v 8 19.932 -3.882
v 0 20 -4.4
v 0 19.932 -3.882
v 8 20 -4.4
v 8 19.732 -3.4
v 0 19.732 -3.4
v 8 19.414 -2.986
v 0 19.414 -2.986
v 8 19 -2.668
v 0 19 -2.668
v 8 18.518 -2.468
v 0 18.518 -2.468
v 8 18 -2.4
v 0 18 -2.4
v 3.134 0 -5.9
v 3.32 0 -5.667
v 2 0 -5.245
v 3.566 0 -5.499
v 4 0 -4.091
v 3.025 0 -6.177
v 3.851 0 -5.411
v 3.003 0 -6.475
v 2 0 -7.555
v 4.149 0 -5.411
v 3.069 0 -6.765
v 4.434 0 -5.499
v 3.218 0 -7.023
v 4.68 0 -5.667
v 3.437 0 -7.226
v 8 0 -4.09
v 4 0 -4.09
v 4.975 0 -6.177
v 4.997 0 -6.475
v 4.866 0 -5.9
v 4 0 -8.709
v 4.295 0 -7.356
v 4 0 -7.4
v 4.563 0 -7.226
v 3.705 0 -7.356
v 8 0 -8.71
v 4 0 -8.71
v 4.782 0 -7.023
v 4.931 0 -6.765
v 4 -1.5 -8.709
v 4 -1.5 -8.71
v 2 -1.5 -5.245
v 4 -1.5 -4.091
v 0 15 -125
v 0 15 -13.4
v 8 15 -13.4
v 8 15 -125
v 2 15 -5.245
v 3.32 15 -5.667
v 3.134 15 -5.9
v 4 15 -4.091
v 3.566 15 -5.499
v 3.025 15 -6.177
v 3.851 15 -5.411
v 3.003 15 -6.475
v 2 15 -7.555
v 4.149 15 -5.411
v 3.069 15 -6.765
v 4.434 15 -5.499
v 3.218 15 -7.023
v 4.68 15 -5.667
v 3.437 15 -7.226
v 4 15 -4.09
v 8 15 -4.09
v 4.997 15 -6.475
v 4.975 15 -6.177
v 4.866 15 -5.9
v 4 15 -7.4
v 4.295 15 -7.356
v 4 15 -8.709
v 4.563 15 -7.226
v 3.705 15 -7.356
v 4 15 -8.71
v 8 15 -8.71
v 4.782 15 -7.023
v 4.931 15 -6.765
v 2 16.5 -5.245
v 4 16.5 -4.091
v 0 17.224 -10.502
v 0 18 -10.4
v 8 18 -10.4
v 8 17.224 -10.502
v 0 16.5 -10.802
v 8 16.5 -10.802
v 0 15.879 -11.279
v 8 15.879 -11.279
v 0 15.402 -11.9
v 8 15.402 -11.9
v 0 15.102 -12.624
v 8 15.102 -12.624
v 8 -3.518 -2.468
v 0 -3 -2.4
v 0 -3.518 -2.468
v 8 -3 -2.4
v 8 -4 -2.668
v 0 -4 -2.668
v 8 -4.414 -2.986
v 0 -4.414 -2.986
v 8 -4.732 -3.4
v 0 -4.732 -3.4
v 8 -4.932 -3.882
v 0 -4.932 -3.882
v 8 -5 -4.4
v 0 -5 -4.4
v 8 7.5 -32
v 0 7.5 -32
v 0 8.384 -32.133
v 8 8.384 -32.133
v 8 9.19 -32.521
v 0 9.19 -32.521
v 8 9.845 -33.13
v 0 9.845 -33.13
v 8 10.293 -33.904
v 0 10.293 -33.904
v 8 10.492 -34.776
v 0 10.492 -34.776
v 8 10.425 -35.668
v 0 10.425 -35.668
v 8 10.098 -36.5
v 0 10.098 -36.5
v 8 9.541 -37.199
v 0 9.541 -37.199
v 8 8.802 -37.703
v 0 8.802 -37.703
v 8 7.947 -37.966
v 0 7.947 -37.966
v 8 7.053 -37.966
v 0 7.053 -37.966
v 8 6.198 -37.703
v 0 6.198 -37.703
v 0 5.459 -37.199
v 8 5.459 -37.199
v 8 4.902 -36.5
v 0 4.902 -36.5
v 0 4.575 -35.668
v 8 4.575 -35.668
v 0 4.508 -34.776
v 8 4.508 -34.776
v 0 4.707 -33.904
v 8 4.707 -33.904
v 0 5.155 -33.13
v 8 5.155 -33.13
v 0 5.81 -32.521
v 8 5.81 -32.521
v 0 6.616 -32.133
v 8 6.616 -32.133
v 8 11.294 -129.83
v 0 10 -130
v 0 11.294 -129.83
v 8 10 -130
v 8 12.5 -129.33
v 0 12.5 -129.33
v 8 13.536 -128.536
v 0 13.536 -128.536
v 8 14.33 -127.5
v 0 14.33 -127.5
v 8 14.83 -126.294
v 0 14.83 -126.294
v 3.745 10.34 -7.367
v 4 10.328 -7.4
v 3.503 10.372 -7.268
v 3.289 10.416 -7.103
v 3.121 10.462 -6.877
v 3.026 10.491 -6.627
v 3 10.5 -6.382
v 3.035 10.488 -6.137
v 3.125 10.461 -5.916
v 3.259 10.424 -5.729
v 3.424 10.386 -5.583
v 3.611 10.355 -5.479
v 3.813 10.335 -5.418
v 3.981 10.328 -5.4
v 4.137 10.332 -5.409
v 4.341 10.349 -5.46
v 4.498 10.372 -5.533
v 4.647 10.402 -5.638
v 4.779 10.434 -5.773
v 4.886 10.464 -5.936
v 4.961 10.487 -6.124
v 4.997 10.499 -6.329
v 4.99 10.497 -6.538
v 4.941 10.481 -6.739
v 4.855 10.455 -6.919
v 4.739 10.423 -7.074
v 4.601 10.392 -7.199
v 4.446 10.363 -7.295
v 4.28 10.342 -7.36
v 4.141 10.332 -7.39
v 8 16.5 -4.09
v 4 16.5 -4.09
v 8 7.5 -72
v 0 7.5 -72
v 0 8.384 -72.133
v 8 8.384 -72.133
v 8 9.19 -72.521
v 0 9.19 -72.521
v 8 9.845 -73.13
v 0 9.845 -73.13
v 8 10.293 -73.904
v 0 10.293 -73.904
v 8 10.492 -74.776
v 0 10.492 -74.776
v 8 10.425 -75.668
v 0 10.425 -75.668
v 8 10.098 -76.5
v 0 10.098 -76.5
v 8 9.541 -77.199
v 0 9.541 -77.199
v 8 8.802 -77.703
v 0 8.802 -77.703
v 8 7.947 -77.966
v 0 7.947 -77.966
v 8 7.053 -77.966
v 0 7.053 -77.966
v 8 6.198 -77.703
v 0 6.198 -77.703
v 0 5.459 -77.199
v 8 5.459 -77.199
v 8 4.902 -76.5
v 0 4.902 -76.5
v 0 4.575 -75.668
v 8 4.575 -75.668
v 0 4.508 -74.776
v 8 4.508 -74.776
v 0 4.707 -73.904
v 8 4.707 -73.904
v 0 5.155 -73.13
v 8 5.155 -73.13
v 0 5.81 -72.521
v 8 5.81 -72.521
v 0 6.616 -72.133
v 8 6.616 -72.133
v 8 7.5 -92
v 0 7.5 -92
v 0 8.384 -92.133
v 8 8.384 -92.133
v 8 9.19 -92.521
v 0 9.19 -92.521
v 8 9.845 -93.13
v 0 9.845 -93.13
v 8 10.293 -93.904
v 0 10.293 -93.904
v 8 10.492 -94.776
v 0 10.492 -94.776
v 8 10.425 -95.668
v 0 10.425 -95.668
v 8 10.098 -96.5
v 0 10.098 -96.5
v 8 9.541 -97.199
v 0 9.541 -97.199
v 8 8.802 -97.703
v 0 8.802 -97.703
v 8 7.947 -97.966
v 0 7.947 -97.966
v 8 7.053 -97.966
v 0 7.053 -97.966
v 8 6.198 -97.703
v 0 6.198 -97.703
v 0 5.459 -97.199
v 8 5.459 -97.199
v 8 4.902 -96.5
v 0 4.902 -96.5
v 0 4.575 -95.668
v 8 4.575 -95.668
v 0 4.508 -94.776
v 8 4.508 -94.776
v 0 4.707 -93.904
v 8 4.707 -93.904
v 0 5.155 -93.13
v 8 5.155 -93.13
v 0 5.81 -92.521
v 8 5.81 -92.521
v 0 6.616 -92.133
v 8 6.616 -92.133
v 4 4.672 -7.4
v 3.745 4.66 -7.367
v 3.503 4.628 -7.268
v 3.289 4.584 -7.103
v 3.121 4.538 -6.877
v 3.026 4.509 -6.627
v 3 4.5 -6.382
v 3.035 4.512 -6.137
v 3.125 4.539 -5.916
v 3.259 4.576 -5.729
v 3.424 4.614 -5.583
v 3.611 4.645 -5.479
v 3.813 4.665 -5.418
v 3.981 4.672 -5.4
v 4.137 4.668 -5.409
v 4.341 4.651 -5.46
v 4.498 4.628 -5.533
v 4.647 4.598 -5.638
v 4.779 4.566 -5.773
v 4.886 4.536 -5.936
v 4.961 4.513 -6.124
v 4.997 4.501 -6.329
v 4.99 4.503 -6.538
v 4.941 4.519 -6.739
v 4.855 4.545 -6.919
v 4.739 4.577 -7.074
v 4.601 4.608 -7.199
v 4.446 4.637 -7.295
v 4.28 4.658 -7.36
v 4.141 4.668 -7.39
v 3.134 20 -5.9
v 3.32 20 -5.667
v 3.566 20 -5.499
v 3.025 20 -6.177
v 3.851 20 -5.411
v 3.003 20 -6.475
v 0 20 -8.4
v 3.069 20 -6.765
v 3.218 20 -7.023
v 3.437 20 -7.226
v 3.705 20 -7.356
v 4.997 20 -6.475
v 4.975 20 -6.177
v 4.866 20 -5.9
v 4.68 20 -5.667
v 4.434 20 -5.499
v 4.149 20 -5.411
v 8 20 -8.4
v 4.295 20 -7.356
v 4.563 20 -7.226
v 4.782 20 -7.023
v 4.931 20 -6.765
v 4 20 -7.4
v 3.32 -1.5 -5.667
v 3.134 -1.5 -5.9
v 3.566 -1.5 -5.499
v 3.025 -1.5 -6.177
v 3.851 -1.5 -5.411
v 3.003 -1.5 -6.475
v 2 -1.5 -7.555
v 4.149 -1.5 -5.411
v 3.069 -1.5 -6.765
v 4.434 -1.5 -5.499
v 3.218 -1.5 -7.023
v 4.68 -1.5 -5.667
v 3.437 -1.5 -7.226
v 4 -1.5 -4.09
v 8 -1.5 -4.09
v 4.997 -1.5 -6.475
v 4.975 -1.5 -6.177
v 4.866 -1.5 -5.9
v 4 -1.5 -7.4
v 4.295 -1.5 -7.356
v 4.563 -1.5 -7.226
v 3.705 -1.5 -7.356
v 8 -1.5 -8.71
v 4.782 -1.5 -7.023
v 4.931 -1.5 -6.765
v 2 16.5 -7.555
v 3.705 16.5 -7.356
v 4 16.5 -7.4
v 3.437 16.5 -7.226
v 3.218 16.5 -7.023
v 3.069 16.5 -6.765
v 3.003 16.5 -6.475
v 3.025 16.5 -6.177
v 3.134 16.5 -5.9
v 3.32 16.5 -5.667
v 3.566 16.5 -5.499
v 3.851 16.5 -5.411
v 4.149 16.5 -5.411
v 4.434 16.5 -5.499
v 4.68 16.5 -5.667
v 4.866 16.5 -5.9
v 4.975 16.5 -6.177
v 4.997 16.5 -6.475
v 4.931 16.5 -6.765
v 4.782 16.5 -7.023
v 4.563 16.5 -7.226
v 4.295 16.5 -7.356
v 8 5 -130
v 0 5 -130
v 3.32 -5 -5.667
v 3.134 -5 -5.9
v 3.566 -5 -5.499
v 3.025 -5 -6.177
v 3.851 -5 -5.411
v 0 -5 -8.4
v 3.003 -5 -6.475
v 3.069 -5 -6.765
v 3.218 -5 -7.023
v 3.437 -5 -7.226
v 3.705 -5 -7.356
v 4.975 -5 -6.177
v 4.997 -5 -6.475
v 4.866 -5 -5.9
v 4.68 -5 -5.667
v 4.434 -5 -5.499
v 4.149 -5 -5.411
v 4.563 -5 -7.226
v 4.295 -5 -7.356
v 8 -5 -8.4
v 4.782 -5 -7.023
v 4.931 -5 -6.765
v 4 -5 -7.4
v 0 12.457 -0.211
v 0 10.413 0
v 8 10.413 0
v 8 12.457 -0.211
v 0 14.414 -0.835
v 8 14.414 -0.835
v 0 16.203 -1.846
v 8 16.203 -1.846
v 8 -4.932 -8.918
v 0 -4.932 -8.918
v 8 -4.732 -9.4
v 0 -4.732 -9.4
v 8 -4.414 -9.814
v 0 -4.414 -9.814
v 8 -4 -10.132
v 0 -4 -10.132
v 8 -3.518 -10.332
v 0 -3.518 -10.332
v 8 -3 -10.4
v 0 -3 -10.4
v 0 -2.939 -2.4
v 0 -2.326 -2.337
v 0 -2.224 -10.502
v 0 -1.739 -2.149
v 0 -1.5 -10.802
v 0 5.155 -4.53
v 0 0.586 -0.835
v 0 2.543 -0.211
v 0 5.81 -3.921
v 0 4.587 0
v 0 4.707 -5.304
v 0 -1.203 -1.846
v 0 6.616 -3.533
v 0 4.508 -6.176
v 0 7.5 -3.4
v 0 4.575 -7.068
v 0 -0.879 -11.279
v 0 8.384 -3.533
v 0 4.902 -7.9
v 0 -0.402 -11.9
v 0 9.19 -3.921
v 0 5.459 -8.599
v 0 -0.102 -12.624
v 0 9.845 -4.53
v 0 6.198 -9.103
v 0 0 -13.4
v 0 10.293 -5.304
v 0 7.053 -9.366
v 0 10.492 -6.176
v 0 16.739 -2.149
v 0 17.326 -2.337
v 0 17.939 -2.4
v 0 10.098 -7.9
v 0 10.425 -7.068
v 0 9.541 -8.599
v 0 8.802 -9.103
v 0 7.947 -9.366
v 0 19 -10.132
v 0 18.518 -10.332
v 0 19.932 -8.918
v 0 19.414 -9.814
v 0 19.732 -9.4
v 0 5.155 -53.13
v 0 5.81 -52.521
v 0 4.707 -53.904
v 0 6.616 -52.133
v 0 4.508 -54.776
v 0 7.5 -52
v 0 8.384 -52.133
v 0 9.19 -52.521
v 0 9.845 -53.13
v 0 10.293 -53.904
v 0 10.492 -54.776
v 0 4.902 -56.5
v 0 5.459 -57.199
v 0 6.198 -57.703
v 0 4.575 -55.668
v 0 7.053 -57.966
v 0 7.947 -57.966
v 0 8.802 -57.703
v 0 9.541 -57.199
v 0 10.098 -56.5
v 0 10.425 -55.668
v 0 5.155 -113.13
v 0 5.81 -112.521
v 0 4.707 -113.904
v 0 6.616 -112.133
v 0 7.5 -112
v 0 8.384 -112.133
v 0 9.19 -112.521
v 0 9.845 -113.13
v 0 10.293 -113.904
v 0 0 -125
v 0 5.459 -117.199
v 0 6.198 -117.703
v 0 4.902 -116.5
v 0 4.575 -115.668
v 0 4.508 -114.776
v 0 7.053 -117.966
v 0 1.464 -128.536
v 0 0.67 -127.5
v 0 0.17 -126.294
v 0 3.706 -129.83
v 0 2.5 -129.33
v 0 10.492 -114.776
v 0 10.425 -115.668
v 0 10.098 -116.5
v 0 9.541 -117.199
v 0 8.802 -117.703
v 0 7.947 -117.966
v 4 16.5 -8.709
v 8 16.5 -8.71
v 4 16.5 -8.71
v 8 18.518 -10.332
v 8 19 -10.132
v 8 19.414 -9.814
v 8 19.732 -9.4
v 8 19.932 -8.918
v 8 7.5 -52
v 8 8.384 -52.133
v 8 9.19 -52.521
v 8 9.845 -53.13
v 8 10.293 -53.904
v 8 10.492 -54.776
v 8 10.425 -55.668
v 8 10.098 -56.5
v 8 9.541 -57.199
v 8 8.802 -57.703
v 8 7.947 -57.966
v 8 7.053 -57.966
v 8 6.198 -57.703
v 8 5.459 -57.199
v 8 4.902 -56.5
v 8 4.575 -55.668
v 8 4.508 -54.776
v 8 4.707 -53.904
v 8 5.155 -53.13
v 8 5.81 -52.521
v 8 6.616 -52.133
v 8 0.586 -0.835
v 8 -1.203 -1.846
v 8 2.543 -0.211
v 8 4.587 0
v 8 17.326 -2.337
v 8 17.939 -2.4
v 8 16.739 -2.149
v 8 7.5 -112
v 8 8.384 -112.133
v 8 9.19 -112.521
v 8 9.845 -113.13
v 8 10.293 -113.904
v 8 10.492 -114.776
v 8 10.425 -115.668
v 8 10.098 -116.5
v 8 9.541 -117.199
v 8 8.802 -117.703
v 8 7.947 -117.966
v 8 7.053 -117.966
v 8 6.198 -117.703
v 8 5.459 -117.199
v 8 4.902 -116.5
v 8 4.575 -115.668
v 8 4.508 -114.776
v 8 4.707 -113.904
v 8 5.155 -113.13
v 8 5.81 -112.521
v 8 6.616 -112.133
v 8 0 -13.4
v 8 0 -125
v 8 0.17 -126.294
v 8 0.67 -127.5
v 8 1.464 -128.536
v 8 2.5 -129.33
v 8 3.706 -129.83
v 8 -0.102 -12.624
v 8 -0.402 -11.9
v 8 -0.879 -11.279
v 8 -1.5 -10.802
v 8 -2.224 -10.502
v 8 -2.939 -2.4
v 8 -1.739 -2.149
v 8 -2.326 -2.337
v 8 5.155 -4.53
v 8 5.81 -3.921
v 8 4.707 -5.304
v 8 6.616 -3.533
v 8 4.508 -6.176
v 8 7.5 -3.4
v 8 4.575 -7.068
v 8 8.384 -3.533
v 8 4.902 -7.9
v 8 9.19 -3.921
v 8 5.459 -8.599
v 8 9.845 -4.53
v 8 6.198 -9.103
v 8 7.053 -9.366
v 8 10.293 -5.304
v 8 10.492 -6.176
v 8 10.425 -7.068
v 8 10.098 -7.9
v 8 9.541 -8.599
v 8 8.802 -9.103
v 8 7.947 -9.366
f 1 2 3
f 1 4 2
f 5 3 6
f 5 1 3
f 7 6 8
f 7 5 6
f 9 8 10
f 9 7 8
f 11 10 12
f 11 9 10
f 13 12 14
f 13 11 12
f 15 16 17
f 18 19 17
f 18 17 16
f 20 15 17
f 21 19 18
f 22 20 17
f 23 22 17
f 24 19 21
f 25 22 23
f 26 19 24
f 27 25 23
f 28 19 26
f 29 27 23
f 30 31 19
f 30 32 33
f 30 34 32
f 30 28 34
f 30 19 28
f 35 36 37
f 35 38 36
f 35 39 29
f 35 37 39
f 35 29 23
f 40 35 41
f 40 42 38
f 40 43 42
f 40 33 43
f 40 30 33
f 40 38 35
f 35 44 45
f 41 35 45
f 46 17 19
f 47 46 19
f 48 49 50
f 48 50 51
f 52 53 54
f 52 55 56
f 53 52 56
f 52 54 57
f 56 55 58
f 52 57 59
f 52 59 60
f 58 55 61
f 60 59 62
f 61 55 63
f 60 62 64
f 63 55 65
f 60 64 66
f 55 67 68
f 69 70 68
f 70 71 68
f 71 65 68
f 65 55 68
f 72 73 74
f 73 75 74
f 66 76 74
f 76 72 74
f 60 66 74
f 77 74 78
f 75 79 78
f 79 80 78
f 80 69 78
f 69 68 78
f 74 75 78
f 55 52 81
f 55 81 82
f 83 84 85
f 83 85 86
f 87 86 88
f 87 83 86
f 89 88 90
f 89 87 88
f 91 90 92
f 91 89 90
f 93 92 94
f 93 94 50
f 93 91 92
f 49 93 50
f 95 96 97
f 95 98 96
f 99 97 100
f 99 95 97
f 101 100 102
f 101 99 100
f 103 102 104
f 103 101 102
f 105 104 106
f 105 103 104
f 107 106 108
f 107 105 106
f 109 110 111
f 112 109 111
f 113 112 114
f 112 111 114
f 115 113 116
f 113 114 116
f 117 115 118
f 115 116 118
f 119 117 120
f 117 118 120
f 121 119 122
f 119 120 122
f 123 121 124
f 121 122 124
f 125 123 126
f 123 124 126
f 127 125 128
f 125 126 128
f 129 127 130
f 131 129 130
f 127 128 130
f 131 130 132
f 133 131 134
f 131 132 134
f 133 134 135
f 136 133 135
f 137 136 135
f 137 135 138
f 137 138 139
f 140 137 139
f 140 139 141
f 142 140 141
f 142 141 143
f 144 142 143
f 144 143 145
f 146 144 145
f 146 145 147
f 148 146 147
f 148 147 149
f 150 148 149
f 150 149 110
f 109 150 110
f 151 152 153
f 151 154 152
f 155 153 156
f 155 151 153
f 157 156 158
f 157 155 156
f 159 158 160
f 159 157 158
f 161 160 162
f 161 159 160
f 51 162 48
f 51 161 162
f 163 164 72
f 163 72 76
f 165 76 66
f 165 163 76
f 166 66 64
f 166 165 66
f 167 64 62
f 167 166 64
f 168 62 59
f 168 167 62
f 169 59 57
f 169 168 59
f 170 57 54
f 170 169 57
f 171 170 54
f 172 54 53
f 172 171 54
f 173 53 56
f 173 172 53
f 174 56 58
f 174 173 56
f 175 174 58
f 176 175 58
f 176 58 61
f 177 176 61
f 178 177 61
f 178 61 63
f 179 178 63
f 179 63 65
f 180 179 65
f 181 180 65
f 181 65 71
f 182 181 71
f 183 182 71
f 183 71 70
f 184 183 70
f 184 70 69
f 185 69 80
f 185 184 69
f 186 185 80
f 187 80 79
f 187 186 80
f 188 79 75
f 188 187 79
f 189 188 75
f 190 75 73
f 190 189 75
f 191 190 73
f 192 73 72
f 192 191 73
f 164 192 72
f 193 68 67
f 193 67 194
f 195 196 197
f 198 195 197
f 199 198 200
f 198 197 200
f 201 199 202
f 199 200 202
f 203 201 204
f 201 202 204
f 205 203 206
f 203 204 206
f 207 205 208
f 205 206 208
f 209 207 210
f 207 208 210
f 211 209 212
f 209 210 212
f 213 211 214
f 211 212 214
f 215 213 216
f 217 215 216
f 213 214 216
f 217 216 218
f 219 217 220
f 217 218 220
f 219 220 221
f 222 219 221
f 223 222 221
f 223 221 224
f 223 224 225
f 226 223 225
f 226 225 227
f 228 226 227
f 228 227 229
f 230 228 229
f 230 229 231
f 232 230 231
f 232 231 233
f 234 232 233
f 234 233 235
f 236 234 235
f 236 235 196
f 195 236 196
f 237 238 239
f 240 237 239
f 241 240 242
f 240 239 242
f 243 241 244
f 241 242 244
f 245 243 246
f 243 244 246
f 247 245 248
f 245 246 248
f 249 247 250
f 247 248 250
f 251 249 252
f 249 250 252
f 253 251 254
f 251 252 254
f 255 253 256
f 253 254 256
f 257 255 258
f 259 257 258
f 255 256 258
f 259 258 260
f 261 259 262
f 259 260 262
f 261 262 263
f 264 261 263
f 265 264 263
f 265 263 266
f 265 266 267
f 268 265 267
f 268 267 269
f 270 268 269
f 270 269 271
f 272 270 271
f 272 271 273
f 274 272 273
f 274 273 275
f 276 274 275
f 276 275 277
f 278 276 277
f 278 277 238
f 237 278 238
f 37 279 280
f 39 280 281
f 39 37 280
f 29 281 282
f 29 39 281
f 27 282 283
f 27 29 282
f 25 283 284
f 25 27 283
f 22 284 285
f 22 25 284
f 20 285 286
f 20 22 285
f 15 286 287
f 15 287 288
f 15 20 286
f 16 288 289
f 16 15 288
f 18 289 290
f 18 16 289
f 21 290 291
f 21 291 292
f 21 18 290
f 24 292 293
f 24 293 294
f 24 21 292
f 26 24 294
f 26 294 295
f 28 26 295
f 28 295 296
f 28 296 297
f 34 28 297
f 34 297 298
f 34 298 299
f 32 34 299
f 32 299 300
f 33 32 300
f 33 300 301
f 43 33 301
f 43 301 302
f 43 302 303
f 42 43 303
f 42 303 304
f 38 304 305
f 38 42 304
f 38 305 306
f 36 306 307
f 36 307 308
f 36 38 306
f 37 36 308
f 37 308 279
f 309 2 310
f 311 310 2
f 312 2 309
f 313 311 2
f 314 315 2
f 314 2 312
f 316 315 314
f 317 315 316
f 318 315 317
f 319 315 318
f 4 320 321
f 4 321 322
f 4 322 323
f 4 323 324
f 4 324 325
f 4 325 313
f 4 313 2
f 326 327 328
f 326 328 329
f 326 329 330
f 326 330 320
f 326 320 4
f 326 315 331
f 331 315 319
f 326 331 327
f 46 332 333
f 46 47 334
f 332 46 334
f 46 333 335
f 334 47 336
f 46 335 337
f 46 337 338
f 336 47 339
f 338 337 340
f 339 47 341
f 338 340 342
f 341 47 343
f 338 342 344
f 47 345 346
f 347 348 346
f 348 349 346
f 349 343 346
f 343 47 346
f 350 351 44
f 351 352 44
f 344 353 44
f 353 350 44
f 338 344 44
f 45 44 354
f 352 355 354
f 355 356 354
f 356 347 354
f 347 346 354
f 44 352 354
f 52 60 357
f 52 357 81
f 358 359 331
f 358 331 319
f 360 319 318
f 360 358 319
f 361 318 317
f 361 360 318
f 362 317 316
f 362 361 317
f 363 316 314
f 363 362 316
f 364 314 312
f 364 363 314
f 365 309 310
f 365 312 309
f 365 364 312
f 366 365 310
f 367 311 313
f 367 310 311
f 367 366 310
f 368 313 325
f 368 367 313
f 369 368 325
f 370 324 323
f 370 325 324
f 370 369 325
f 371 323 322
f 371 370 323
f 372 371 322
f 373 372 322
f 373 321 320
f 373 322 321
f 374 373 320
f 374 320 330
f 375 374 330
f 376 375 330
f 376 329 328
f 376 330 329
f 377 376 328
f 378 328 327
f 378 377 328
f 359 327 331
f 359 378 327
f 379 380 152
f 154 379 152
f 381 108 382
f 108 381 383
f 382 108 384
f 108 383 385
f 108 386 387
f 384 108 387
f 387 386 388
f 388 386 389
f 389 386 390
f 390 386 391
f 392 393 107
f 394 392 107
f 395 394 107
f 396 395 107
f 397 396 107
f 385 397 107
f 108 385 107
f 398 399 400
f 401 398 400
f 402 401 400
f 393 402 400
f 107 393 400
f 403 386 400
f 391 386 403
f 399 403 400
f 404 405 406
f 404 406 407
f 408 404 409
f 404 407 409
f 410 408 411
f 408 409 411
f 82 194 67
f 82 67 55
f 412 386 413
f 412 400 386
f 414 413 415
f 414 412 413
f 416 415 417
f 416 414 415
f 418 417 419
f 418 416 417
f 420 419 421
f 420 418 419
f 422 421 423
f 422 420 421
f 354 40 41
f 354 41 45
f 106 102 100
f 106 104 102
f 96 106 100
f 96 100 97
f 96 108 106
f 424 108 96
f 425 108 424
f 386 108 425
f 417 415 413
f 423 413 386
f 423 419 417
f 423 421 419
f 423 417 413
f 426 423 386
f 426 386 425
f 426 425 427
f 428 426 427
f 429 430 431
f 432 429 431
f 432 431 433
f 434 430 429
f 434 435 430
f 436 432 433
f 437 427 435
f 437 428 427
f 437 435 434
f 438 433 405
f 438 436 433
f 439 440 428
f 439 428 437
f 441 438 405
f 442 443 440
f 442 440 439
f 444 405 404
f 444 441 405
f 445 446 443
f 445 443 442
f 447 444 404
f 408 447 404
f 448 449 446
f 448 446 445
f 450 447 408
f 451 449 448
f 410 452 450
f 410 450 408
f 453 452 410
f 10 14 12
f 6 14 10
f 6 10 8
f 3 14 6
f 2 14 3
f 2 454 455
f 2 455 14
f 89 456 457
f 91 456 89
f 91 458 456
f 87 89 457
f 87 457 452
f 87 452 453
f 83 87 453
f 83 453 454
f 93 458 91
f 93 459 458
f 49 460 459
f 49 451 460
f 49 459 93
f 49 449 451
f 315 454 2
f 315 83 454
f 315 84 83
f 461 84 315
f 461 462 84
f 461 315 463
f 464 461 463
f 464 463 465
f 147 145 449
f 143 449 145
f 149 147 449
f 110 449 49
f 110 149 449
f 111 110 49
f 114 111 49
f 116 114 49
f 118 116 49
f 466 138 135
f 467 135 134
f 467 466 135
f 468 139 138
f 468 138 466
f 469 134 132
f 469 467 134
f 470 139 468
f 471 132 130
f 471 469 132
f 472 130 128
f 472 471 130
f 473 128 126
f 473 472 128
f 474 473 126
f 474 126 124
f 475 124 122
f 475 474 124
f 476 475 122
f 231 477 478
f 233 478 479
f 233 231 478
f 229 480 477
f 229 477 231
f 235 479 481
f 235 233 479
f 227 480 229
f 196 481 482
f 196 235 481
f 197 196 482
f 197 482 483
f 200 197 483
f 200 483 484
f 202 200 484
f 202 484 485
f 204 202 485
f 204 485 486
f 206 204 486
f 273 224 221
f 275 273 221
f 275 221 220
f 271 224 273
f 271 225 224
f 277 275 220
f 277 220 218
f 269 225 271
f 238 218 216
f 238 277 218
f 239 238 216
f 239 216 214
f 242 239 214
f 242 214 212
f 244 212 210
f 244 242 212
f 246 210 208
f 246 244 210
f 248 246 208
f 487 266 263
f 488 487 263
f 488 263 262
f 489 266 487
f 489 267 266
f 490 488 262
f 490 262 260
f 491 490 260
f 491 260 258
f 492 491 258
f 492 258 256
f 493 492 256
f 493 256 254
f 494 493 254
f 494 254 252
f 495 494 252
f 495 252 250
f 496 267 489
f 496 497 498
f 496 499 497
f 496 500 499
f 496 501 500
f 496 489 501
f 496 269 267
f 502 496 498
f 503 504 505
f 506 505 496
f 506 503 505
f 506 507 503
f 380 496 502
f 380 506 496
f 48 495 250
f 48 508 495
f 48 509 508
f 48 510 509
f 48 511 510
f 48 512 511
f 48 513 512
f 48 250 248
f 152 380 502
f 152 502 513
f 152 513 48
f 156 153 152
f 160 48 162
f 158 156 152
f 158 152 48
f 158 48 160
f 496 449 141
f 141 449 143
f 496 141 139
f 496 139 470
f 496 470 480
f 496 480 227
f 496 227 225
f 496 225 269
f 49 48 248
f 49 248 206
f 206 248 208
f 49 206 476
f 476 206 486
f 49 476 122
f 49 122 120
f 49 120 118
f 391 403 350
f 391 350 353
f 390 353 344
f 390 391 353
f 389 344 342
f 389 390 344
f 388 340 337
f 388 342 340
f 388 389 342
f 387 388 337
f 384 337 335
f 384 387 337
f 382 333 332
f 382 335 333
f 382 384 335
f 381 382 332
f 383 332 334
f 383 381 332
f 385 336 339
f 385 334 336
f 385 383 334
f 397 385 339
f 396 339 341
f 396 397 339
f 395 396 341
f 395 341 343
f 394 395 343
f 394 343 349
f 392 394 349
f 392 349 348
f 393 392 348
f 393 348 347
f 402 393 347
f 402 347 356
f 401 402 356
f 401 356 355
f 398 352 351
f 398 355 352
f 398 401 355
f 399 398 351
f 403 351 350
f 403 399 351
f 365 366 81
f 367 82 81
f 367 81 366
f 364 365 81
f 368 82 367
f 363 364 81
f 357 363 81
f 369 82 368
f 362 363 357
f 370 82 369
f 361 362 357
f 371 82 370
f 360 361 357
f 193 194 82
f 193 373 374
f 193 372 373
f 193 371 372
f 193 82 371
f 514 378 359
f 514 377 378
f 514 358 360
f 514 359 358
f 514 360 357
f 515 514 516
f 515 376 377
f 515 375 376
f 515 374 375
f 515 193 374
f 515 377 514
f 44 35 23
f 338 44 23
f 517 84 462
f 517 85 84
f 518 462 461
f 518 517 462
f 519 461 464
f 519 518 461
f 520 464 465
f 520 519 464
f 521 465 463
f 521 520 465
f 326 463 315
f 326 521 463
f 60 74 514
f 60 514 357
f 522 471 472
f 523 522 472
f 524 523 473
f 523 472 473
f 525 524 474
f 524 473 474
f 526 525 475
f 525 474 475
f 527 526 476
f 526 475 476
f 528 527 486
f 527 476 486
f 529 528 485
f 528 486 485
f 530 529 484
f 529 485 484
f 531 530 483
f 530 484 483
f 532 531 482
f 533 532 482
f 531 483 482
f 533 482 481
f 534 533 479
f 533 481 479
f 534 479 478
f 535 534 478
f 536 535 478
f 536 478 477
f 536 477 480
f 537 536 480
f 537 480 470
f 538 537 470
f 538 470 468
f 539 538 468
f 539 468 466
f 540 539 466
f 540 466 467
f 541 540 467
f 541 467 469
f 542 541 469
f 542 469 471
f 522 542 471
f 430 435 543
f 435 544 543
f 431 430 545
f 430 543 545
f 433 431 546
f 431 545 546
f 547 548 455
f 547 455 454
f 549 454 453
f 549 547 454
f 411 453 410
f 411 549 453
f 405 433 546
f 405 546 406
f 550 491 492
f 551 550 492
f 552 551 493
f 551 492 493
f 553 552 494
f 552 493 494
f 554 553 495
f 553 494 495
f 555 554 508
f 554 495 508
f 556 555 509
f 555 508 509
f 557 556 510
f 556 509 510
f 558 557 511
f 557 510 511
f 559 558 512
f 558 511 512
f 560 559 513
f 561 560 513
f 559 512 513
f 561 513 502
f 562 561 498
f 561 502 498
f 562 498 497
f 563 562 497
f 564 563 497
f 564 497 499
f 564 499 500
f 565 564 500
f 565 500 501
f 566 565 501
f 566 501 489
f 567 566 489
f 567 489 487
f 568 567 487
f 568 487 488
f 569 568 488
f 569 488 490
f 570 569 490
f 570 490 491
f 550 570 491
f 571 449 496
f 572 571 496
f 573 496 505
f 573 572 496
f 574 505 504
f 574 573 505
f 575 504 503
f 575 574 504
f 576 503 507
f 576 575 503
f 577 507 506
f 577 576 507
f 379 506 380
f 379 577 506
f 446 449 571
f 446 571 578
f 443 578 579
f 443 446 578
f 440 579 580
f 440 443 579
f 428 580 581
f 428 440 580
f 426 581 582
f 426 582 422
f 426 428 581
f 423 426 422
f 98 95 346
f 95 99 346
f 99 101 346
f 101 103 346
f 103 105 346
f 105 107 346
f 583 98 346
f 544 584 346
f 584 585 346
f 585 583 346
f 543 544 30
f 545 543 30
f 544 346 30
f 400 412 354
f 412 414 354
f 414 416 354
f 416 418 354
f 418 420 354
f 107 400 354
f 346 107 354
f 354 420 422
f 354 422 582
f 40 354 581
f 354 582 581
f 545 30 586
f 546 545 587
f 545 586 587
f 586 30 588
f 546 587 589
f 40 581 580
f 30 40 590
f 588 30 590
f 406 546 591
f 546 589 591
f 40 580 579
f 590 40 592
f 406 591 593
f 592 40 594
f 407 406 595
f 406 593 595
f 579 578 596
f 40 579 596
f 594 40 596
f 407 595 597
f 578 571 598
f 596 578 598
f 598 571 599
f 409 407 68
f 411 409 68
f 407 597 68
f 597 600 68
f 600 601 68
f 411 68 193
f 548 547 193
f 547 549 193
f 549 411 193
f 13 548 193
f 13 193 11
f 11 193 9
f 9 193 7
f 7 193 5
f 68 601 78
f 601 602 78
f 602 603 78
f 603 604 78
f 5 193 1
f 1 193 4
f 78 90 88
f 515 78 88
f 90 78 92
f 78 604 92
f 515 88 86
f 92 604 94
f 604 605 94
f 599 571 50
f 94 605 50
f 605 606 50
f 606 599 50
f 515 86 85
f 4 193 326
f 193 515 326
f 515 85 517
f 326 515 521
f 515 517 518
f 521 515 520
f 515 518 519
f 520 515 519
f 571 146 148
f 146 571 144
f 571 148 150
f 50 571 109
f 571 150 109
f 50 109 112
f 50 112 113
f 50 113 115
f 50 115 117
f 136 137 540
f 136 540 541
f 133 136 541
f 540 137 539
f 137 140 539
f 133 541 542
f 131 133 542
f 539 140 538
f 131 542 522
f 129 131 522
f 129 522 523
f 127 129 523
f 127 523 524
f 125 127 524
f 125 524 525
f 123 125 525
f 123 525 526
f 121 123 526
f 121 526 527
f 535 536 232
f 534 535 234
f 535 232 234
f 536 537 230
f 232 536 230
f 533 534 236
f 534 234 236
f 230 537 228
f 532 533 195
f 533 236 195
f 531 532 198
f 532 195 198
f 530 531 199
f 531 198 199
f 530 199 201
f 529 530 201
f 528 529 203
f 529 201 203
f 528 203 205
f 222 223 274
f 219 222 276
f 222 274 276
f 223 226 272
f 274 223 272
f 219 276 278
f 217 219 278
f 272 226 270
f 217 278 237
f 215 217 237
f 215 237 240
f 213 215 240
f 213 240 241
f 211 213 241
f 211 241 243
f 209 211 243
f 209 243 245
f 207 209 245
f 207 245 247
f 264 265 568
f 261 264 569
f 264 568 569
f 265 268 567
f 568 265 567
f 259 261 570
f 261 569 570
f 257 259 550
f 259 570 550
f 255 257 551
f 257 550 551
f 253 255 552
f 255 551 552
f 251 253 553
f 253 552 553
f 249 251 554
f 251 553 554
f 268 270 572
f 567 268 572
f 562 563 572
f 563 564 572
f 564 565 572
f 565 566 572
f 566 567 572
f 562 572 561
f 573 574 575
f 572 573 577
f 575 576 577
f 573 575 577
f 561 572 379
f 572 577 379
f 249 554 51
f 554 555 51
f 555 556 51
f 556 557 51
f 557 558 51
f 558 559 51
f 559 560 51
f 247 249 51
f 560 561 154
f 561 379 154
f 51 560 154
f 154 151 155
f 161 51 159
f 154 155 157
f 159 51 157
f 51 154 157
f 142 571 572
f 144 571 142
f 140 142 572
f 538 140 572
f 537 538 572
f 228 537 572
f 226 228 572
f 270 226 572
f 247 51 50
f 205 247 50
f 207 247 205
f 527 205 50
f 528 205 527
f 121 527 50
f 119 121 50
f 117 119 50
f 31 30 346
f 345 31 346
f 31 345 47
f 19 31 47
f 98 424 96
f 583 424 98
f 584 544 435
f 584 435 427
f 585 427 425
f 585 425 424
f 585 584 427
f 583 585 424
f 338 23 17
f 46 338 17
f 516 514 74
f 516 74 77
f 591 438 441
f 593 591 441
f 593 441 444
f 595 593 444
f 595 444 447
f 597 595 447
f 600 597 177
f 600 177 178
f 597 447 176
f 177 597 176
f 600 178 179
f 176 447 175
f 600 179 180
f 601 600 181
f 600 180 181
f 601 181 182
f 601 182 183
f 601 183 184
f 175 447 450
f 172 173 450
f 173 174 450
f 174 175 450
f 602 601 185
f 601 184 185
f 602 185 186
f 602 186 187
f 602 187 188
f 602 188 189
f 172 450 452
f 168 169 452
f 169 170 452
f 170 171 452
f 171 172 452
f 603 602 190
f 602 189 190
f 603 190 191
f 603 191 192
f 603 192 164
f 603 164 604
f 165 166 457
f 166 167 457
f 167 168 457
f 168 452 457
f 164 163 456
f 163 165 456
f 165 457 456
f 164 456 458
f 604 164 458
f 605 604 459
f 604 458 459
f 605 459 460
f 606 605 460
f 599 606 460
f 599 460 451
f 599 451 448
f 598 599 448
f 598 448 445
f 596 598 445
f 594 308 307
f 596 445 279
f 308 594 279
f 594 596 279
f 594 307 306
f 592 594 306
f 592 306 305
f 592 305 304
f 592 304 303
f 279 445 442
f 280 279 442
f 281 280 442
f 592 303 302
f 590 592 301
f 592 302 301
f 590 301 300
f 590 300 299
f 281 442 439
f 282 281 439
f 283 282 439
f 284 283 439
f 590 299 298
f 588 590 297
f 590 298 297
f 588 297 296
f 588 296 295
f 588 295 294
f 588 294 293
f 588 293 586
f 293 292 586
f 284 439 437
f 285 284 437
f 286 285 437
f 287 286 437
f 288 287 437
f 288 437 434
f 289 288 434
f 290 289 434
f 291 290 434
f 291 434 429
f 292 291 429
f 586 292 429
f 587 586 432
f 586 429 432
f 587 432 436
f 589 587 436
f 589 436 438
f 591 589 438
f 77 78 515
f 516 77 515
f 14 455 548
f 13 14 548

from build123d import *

# Parameters (mm, degrees)
SKETCH_1_W                = 130
SKETCH_1_H                = 15
EXTRUDE_1_DEPTH           = 8
CUT_EXTRUDE_10_REACH      = 133.107
SKETCH_17_R               = 3
CUT_EXTRUDE_12_REACH      = 133.107
SKETCH_15_R               = 3
SKETCH_22_W               = 8
SKETCH_22_H               = 8
EXTRUDE_7_DEPTH           = 5
CUT_EXTRUDE_18_DEPTH      = 1.5
SKETCH_25_W               = 4.62
SKETCH_25_H               = 1.5
CUT_EXTRUDE_19_DEPTH      = 4
FILLET_8_R                = 3
FILLET_9_R                = 2
FILLET_10_R               = 2
FILLET_11_R               = 3
CUT_EXTRUDE_20_DEPTH      = 15.5
CUT_EXTRUDE_20_DEPTH_BACK = 28.5
SKETCH_21_R               = 1
FILLET_12_R               = 10
FILLET_13_R               = 5


# Some blends are built 0.0001 mm under size
with BuildPart() as part:
    # 草图1 → 凸台-拉伸1 (new body)
    with BuildSketch(Plane(origin=(0, 0, 0), x_dir=(0, 0, -1), z_dir=(1, 0, 0))):
        with Locations((65, 7.5)):
            Rectangle(SKETCH_1_W, SKETCH_1_H)
    extrude(amount=EXTRUDE_1_DEPTH)

    # 草图17 → 切除-拉伸10 (cut, up to next)
    with BuildSketch(Plane.ZY, mode=Mode.PRIVATE) as cut_extrude_10_sk1:
        with Locations((-115, 7.5)):
            Circle(SKETCH_17_R)
    cut_extrude_10_tool1 = extrude(cut_extrude_10_sk1.sketch, amount=-CUT_EXTRUDE_10_REACH, mode=Mode.PRIVATE) & part.part
    # 草图17 → 切除-拉伸10 (cut, up to next)
    with BuildSketch(Plane.ZY, mode=Mode.PRIVATE) as cut_extrude_10_sk2:
        with Locations((-95, 7.5)):
            Circle(SKETCH_17_R)
    cut_extrude_10_tool2 = extrude(cut_extrude_10_sk2.sketch, amount=-CUT_EXTRUDE_10_REACH, mode=Mode.PRIVATE) & part.part
    # 草图17 → 切除-拉伸10 (cut, up to next)
    with BuildSketch(Plane.ZY, mode=Mode.PRIVATE) as cut_extrude_10_sk3:
        with Locations((-75, 7.5)):
            Circle(SKETCH_17_R)
    cut_extrude_10_tool3 = extrude(cut_extrude_10_sk3.sketch, amount=-CUT_EXTRUDE_10_REACH, mode=Mode.PRIVATE) & part.part
    # 草图17 → 切除-拉伸10 (cut, up to next)
    with BuildSketch(Plane.ZY, mode=Mode.PRIVATE) as cut_extrude_10_sk4:
        with Locations((-55, 7.5)):
            Circle(SKETCH_17_R)
    cut_extrude_10_tool4 = extrude(cut_extrude_10_sk4.sketch, amount=-CUT_EXTRUDE_10_REACH, mode=Mode.PRIVATE) & part.part
    # 草图17 → 切除-拉伸10 (cut, up to next)
    with BuildSketch(Plane.ZY, mode=Mode.PRIVATE) as cut_extrude_10_sk5:
        with Locations((-35, 7.5)):
            Circle(SKETCH_17_R)
    cut_extrude_10_tool5 = extrude(cut_extrude_10_sk5.sketch, amount=-CUT_EXTRUDE_10_REACH, mode=Mode.PRIVATE) & part.part
    add(cut_extrude_10_tool1.solids().sort_by_distance((0, 7.5, -115))[0], mode=Mode.SUBTRACT)
    add(cut_extrude_10_tool2.solids().sort_by_distance((0, 7.5, -95))[0], mode=Mode.SUBTRACT)
    add(cut_extrude_10_tool3.solids().sort_by_distance((0, 7.5, -75))[0], mode=Mode.SUBTRACT)
    add(cut_extrude_10_tool4.solids().sort_by_distance((0, 7.5, -55))[0], mode=Mode.SUBTRACT)
    add(cut_extrude_10_tool5.solids().sort_by_distance((0, 7.5, -35))[0], mode=Mode.SUBTRACT)

    # 草图15 → 切除-拉伸12 (cut, up to next)
    with BuildSketch(Plane.ZY, mode=Mode.PRIVATE) as cut_extrude_12_sk1:
        with Locations((-6.4, 7.5)):
            Circle(SKETCH_15_R)
    cut_extrude_12_tool1 = extrude(cut_extrude_12_sk1.sketch, amount=-CUT_EXTRUDE_12_REACH, mode=Mode.PRIVATE) & part.part
    add(cut_extrude_12_tool1.solids().sort_by_distance((0, 7.5, -6.4))[0], mode=Mode.SUBTRACT)

    # 草图22 → 凸台-拉伸7 (add)
    with BuildSketch(Plane(origin=(0, 15, 0), x_dir=(1, 0, 0), z_dir=(0, 1, 0))):
        with Locations((4, 6.4)):
            Rectangle(SKETCH_22_W, SKETCH_22_H)
    extrude_7 = extrude(amount=EXTRUDE_7_DEPTH)

    # 草图24 → 切除-拉伸18 (cut)
    with BuildSketch(Plane(origin=(0, 15, 0), x_dir=(1, 0, 0), z_dir=(0, 1, 0))):
        Polygon((4, 4.090598923), (6, 5.245299462), (6, 7.554700538), (4, 8.709401077), (2, 7.554700538), (2, 5.245299462), align=None)
    cut_extrude_18 = extrude(amount=CUT_EXTRUDE_18_DEPTH, mode=Mode.SUBTRACT)

    # 草图25 → 切除-拉伸19 (cut)
    with BuildSketch(Plane(origin=(8, 0, 0), x_dir=(0, 0, -1), z_dir=(1, 0, 0))):
        with Locations((6.4, 15.75)):
            Rectangle(SKETCH_25_W, SKETCH_25_H)
    cut_extrude_19 = extrude(amount=-CUT_EXTRUDE_19_DEPTH, mode=Mode.SUBTRACT)

    # 圆角8
    # the kernel refuses this fillet: 3 mm, written as the material it adds along each edge
    with BuildSketch(Plane(origin=(8, 15, -2.4), x_dir=(0, 1.5846583304811187e-12, 1.0), z_dir=(-1, 0, 0))) as fillet_8_piece_1:
        with BuildLine():
            CenterArc((3, 2.939387691), FILLET_8_R, 180, 78.463040967)
            Line((0, 2.939387691), (-0.06, 2.939387691))
            Line((-0.06, 2.939387691), (-0.06, 0))
            Line((-0.06, 0), (0, -0.06))
            ThreePointArc((0, -0.06), (1.2, -0.06), (2.388, -0.058787754))
            Line((2.388, -0.058787754), (2.4, 0))
        make_face()
    extrude(amount=8)
    with BuildSketch(Plane(origin=(0, 15, -10.4), x_dir=(0, 0, -1), z_dir=(1, 0, 0))) as fillet_8_piece_2:
        with BuildLine():
            CenterArc((FILLET_8_R, FILLET_8_R), FILLET_8_R, 180, 90)
            Line((0, FILLET_8_R), (-FILLET_8_R * 0.02, FILLET_8_R))
            Line((-FILLET_8_R * 0.02, FILLET_8_R), (-FILLET_8_R * 0.02, -FILLET_8_R * 0.02))
            Line((-FILLET_8_R * 0.02, -FILLET_8_R * 0.02), (FILLET_8_R, -FILLET_8_R * 0.02))
            Line((FILLET_8_R, -FILLET_8_R * 0.02), (FILLET_8_R, 0))
        make_face()
    extrude(amount=8)

    # 圆角9
    fillet_9_edges = [part.edges().sort_by_distance(p)[0] for p in [
        (4, 20, -2.4),
        (4, 20, -10.4),
    ]]
    fillet(fillet_9_edges, radius=FILLET_9_R - 0.0001)  # a hair under: the kernel refuses the full size

    # 镜向6: 凸台-拉伸7, 切除-拉伸18, 切除-拉伸19 across plane
    add(extrude_7.mirror(Plane.ZX.offset(7.5)))
    add(cut_extrude_18.mirror(Plane.ZX.offset(7.5)), mode=Mode.SUBTRACT)
    add(cut_extrude_19.mirror(Plane.ZX.offset(7.5)), mode=Mode.SUBTRACT)

    # 圆角10
    fillet_10_edges = [part.edges().sort_by_distance(p)[0] for p in [
        (4, -5, -10.4),
        (4, -5, -2.4),
    ]]
    fillet(fillet_10_edges, radius=FILLET_10_R)

    # 圆角11
    # the kernel refuses this fillet: 3 mm, written as the material it adds along each edge
    with BuildSketch(Plane(origin=(8, 0, -2.4), x_dir=(0, -1, 0), z_dir=(-1, 0, 0))) as fillet_11_piece_1:
        with BuildLine():
            CenterArc((2.939387691, 3), FILLET_11_R, 191.536959033, 78.463040967)
            Line((0, 2.4), (-0.058787754, 2.388))
            ThreePointArc((-0.058787754, 2.388), (-0.06, 1.2), (-0.06, 0))
            Line((-0.06, 0), (0, -0.06))
            Line((0, -0.06), (2.939387691, -0.06))
            Line((2.939387691, -0.06), (2.939387691, 0))
        make_face()
    extrude(amount=8)
    with BuildSketch(Plane(origin=(0, 0, -10.4), x_dir=(0, -1, 0), z_dir=(1, 0, 0))) as fillet_11_piece_2:
        with BuildLine():
            CenterArc((FILLET_11_R, FILLET_11_R), FILLET_11_R, 180, 90)
            Line((0, FILLET_11_R), (-FILLET_11_R * 0.02, FILLET_11_R))
            Line((-FILLET_11_R * 0.02, FILLET_11_R), (-FILLET_11_R * 0.02, -FILLET_11_R * 0.02))
            Line((-FILLET_11_R * 0.02, -FILLET_11_R * 0.02), (FILLET_11_R, -FILLET_11_R * 0.02))
            Line((FILLET_11_R, -FILLET_11_R * 0.02), (FILLET_11_R, 0))
        make_face()
    extrude(amount=8)

    # 草图21 → 切除-拉伸20 (cut, two sides: drawn at the far end of the back side and taken through both)
    with BuildSketch(Plane(origin=(0, 15, 0), x_dir=(1, 0, 0), z_dir=(0, 1, 0)).offset(-CUT_EXTRUDE_20_DEPTH_BACK)):
        with Locations(Location((4, 6.4, 0), (0, 0, 90))):
            Circle(SKETCH_21_R)
    extrude(amount=CUT_EXTRUDE_20_DEPTH + CUT_EXTRUDE_20_DEPTH_BACK, mode=Mode.SUBTRACT)

    # 圆角12
    fillet_12_edges = [part.edges().sort_by_distance(p)[0] for p in [
        (4, 15, 0),
        (4, 0, 0),
    ]]
    fillet(fillet_12_edges, radius=FILLET_12_R)

    # 圆角13
    fillet_13_edges = [part.edges().sort_by_distance(p)[0] for p in [
        (4, 15, -130),
        (4, 0, -130),
    ]]
    fillet(fillet_13_edges, radius=FILLET_13_R)


solid = part.part
